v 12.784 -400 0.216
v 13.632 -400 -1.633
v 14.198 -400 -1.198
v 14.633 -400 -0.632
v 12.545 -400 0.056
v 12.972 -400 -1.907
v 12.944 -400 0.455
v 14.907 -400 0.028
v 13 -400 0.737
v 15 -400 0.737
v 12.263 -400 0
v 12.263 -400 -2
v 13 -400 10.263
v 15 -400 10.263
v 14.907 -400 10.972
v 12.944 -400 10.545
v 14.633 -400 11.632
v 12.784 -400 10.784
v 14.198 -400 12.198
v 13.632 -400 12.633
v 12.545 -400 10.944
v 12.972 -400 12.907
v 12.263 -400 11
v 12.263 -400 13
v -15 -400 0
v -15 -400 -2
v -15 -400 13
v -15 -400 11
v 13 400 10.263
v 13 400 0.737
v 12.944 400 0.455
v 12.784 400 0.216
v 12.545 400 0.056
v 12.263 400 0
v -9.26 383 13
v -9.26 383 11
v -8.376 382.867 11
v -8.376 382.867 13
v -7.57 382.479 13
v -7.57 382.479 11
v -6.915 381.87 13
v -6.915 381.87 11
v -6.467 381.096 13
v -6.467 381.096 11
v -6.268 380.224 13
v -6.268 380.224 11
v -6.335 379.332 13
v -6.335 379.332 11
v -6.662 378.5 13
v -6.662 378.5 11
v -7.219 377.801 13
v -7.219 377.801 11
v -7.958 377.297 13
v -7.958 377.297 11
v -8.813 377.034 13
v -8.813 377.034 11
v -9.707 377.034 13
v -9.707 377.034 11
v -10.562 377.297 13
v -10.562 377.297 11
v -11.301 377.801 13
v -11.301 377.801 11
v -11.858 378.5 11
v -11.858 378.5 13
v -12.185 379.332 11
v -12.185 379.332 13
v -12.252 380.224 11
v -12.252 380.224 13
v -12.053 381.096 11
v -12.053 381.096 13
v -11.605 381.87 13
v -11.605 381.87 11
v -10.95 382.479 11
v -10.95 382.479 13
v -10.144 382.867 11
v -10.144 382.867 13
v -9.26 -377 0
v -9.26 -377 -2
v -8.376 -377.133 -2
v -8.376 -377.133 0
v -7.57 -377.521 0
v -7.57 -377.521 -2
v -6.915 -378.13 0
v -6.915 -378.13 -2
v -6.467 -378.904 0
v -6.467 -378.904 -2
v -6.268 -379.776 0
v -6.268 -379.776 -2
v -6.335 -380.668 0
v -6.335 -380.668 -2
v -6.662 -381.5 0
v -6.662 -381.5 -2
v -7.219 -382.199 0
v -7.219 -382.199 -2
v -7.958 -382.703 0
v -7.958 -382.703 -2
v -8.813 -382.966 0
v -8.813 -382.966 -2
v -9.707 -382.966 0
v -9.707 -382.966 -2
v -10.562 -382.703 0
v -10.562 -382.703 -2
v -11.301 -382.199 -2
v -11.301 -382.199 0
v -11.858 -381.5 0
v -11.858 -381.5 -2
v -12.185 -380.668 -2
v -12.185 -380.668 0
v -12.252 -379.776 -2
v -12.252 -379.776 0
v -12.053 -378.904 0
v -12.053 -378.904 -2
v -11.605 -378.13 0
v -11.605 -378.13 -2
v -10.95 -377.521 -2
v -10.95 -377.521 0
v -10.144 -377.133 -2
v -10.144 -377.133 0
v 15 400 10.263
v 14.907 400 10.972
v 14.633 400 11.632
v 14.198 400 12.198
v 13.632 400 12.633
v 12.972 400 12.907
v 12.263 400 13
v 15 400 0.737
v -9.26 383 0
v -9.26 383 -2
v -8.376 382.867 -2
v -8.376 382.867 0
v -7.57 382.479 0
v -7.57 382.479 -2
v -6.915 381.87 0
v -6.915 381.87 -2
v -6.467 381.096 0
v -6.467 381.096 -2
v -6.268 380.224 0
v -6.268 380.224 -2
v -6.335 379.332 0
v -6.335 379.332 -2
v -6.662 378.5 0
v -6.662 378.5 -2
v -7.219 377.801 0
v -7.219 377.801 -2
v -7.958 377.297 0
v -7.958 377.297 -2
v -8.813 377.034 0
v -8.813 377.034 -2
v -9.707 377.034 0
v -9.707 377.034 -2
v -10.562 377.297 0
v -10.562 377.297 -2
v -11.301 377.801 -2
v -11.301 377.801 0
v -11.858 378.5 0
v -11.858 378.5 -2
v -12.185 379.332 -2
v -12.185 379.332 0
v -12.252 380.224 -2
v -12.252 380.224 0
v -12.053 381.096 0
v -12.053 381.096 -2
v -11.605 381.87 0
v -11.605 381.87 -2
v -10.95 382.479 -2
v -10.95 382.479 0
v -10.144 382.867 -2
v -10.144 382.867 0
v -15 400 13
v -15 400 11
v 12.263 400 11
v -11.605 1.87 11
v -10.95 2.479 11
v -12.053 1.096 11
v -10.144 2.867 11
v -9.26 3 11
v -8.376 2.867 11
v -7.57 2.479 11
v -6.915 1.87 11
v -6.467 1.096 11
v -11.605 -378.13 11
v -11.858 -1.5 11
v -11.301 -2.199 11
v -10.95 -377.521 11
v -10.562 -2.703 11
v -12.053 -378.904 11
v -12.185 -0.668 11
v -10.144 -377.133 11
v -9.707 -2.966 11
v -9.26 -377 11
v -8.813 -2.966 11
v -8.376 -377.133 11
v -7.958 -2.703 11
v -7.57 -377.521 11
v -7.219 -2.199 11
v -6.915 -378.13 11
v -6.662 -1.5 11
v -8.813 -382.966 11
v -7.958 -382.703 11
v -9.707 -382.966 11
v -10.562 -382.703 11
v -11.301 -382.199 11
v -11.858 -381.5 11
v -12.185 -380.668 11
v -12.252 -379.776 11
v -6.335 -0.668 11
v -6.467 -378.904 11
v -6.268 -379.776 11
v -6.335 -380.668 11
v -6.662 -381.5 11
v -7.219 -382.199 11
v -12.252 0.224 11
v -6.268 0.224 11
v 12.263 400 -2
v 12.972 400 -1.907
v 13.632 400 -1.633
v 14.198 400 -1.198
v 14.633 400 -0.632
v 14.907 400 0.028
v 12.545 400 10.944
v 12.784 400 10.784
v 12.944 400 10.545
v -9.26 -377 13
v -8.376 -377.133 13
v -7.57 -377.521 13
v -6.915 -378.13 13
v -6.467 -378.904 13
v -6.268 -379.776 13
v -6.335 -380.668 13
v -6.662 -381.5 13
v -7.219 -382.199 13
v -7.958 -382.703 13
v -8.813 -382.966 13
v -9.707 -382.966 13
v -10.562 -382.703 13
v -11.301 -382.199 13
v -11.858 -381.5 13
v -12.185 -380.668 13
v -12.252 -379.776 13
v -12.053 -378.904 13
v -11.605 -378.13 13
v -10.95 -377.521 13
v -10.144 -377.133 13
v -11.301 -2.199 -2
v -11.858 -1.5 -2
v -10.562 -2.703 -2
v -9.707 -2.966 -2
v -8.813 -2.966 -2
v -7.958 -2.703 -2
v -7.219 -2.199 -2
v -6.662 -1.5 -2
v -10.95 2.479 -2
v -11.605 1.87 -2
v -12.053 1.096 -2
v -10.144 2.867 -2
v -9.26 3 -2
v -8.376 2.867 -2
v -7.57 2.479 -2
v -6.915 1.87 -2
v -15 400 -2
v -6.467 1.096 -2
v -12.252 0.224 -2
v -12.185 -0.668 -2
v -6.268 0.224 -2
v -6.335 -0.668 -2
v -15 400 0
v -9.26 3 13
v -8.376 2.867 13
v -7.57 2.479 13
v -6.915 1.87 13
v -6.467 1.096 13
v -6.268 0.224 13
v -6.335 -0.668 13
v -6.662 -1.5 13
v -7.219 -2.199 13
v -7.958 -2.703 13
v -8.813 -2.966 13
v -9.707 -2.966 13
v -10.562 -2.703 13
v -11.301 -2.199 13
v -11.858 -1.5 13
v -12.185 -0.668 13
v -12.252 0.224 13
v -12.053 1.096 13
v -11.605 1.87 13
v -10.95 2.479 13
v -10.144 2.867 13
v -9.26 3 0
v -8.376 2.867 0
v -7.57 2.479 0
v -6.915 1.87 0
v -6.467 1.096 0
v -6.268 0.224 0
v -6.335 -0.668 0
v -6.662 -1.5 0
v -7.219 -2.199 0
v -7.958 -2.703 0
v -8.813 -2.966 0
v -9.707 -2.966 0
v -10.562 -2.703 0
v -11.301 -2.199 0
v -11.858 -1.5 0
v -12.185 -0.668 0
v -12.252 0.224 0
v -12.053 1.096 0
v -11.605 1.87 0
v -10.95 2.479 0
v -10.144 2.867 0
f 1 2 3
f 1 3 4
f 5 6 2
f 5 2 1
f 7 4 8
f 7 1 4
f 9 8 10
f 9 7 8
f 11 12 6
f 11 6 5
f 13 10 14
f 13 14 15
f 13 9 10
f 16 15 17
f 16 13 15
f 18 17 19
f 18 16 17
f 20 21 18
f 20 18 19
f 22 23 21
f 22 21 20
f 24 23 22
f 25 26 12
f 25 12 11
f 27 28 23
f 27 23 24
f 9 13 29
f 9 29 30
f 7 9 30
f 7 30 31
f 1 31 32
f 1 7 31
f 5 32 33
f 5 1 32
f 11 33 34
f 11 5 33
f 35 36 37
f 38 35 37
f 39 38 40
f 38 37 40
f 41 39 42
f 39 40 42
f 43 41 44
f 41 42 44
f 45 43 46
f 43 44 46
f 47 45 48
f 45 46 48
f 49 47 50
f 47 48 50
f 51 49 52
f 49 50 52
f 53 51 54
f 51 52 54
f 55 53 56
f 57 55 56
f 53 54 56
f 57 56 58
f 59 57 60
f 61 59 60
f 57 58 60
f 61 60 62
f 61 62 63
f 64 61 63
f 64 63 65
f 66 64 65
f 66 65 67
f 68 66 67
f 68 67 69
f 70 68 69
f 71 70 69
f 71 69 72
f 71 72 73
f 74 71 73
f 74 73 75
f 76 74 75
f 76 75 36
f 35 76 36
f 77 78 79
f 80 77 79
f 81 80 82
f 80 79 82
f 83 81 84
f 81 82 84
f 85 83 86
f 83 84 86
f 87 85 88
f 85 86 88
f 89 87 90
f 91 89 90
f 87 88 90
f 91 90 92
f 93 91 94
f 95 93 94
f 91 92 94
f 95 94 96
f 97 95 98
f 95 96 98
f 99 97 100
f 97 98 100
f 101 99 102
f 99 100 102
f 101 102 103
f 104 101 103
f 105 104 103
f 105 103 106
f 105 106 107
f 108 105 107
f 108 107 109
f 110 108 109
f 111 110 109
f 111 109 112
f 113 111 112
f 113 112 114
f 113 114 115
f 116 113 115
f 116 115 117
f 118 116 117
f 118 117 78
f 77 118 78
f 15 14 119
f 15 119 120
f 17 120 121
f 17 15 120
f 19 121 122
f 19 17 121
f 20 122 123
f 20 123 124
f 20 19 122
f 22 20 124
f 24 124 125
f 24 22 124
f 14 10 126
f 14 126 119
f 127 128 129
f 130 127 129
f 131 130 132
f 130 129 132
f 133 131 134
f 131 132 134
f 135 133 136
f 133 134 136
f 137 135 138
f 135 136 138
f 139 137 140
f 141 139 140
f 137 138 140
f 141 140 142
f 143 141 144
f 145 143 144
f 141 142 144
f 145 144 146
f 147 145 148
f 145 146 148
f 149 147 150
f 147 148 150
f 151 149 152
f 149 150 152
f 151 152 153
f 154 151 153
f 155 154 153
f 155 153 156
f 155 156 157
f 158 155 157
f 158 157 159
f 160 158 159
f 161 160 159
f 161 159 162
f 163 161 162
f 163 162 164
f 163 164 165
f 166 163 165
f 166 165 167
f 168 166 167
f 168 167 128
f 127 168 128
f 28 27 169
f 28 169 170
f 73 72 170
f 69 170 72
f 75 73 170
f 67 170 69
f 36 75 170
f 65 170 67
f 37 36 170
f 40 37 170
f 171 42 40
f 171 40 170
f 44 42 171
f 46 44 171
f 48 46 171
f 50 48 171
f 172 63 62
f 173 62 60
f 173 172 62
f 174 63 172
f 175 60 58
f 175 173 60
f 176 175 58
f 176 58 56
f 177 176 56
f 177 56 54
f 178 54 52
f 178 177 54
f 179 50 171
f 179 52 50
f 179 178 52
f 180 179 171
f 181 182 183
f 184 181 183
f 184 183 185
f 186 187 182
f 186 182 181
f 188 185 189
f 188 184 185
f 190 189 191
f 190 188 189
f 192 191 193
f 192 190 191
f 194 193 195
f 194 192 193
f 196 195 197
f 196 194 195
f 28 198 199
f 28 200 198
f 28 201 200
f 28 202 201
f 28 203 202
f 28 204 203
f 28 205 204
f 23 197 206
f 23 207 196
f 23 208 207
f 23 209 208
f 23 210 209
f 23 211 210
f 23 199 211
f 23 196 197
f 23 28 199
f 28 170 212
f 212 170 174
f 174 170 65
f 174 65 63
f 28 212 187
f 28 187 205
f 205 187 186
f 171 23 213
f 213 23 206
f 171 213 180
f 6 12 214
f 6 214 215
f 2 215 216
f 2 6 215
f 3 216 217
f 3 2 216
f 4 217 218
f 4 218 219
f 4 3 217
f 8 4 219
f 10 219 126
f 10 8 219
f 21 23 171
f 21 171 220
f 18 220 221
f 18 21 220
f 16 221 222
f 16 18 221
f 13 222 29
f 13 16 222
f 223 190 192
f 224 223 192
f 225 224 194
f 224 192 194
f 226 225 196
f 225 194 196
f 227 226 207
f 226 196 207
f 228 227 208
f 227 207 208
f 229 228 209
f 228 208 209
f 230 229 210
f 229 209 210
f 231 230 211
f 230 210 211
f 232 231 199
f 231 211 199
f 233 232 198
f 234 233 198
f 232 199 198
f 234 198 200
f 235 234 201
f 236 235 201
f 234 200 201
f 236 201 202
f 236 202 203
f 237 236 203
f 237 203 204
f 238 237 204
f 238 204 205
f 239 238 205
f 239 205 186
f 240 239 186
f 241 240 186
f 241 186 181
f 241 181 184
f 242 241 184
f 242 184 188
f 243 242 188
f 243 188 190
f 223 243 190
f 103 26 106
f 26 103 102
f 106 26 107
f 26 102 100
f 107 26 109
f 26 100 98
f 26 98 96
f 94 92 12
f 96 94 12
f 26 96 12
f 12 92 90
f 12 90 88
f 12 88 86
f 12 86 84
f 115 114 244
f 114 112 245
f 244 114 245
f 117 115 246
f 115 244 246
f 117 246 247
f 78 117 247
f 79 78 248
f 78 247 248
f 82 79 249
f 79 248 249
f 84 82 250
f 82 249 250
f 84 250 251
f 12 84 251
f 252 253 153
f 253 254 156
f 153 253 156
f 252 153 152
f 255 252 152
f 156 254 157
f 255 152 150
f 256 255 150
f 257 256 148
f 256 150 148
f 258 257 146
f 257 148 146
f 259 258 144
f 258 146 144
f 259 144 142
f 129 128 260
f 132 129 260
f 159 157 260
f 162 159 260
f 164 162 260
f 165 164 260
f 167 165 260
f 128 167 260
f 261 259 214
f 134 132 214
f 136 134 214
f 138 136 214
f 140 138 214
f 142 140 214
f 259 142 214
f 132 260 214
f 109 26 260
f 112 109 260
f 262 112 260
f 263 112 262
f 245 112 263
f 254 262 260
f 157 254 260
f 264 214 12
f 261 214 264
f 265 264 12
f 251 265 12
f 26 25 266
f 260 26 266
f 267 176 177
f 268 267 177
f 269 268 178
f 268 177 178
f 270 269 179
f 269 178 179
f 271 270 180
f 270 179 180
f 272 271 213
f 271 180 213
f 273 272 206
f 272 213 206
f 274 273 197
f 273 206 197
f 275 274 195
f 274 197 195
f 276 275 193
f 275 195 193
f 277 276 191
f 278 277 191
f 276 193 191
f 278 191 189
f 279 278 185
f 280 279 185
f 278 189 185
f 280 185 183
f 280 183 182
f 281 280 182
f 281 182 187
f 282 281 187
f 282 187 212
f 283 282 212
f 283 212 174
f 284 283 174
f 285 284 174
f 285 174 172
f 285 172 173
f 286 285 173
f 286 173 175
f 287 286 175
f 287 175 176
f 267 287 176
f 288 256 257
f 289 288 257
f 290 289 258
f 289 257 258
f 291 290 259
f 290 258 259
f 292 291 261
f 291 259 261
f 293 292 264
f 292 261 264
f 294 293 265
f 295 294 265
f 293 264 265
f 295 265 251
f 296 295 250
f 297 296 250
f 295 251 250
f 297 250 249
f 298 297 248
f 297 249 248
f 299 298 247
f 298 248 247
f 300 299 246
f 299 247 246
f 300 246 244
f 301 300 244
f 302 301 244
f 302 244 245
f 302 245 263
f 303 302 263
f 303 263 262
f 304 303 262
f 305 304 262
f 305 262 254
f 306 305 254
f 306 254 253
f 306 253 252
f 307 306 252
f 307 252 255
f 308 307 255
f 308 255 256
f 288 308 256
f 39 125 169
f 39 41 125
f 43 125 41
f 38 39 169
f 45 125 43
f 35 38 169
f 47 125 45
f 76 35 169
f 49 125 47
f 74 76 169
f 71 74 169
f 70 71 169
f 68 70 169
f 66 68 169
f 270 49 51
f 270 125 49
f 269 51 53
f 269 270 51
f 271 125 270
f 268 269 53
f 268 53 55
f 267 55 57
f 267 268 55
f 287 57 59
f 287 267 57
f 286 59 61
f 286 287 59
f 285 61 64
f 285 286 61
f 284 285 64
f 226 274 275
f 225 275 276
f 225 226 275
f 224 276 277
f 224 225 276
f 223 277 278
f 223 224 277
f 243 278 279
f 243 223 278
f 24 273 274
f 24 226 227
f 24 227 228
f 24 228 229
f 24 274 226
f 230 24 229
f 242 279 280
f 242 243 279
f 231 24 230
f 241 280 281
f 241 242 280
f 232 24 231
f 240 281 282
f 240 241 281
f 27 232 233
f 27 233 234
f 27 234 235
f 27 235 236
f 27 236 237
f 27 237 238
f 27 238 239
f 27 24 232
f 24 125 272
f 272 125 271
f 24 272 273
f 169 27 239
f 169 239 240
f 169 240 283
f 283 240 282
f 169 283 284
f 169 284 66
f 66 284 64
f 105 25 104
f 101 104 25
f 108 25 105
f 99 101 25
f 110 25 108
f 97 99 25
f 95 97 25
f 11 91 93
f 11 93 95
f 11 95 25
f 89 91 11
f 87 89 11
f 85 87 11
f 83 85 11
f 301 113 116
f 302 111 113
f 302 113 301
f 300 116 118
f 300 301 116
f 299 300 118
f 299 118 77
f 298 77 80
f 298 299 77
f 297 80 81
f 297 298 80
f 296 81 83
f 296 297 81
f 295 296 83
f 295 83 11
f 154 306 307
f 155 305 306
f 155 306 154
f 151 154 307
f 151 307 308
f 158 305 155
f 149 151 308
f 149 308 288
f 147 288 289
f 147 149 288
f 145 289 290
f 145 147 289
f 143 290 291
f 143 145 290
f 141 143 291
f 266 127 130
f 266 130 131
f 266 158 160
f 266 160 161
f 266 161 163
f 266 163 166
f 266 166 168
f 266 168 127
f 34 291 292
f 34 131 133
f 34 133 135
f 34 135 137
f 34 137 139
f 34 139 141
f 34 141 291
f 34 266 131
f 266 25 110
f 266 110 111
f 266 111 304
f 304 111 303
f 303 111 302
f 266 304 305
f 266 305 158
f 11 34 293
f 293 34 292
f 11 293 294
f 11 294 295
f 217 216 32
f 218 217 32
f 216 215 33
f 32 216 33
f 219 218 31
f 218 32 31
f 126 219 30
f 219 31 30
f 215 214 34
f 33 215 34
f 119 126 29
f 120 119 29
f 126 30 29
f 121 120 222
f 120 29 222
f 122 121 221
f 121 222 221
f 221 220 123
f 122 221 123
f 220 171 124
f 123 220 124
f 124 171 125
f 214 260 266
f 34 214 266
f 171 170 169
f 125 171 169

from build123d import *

# Parameters (mm, degrees)
SKETCH1_W                    = 30
SKETCH1_H                    = 800
BASE_FLANGE1_DEPTH           = 2
EDGE_FLANGE1_STRIP_W         = 9.4732
EDGE_FLANGE1_STRIP_H         = 2
EDGE_FLANGE1_STRIP_CUT_DEPTH = 800
EDGE_FLANGE1_DEPTH           = 800
EDGE_FLANGE2_STRIP_W         = 9.4732
EDGE_FLANGE2_STRIP_H         = 2
EDGE_FLANGE2_STRIP_CUT_DEPTH = 800
EDGE_FLANGE2_DEPTH           = 800
SKETCH12_R                   = 3
CUT_EXTRUDE1_DEPTH           = 401.562105047


# Sheet-metal steps are written as plain solids
with BuildPart() as part:
    # Sketch1 → Base-Flange1 (new body)
    with BuildSketch(Plane.XY):
        Rectangle(SKETCH1_W, SKETCH1_H)
    extrude(amount=-BASE_FLANGE1_DEPTH)

    # Edge-Flange1 strip (across the edge) → Edge-Flange1 strip cut (cut)
    with BuildSketch(Plane(origin=(15, -400, 0), x_dir=(-1, 0, 0), z_dir=(0, 1, 0))):
        with Locations((-2, -1)):
            Rectangle(EDGE_FLANGE1_STRIP_W, EDGE_FLANGE1_STRIP_H)
    extrude(amount=EDGE_FLANGE1_STRIP_CUT_DEPTH, mode=Mode.SUBTRACT)

    # Edge-Flange1 section (across the edge) → Edge-Flange1 (add)
    with BuildSketch(Plane(origin=(15, -400, 0), x_dir=(-1, 0, 0), z_dir=(0, 1, 0))):
        with BuildLine():
            Line((0, 0.7366), (0, 13))
            Line((0, 13), (2, 13))
            Line((2, 13), (2, 0.7366))
            ThreePointArc((2, 0.7366), (2.215745145, 0.215745145), (2.7366, 0))
            Line((2.7366, 0), (2.7366, -2))
            ThreePointArc((2.7366, -2), (0.801531583, -1.198468417), (0, 0.7366))
        make_face()
    extrude(amount=EDGE_FLANGE1_DEPTH)

    # Edge-Flange2 strip (across the edge) → Edge-Flange2 strip cut (cut)
    with BuildSketch(Plane(origin=(13, -400, 13), x_dir=(0, 0, -1), z_dir=(0, 1, 0))):
        with Locations((-2, -1)):
            Rectangle(EDGE_FLANGE2_STRIP_W, EDGE_FLANGE2_STRIP_H)
    extrude(amount=EDGE_FLANGE2_STRIP_CUT_DEPTH, mode=Mode.SUBTRACT)

    # Edge-Flange2 section (across the edge) → Edge-Flange2 (add)
    with BuildSketch(Plane(origin=(13, -400, 13), x_dir=(0, 0, -1), z_dir=(0, 1, 0))):
        with BuildLine():
            Line((0, 0.7366), (0, 28))
            Line((0, 28), (2, 28))
            Line((2, 28), (2, 0.7366))
            ThreePointArc((2, 0.7366), (2.215745145, 0.215745145), (2.7366, 0))
            Line((2.7366, 0), (2.7366, -2))
            ThreePointArc((2.7366, -2), (0.801531583, -1.198468417), (0, 0.7366))
        make_face()
    extrude(amount=EDGE_FLANGE2_DEPTH)

    # Sketch12 → Cut-Extrude1 (cut, through all)
    with BuildSketch(Plane(origin=(0, 0, -2), x_dir=(-1, 0, 0), z_dir=(0, 0, -1))):
        with Locations(Location((9.26, 380, 0), (0, 0, 90))):
            Circle(SKETCH12_R)
        with Locations(Location((9.26, 0, 0), (0, 0, 90))):
            Circle(SKETCH12_R)
        with Locations(Location((9.26, -380, 0), (0, 0, 90))):
            Circle(SKETCH12_R)
    extrude(amount=-CUT_EXTRUDE1_DEPTH, mode=Mode.SUBTRACT)


solid = part.part
